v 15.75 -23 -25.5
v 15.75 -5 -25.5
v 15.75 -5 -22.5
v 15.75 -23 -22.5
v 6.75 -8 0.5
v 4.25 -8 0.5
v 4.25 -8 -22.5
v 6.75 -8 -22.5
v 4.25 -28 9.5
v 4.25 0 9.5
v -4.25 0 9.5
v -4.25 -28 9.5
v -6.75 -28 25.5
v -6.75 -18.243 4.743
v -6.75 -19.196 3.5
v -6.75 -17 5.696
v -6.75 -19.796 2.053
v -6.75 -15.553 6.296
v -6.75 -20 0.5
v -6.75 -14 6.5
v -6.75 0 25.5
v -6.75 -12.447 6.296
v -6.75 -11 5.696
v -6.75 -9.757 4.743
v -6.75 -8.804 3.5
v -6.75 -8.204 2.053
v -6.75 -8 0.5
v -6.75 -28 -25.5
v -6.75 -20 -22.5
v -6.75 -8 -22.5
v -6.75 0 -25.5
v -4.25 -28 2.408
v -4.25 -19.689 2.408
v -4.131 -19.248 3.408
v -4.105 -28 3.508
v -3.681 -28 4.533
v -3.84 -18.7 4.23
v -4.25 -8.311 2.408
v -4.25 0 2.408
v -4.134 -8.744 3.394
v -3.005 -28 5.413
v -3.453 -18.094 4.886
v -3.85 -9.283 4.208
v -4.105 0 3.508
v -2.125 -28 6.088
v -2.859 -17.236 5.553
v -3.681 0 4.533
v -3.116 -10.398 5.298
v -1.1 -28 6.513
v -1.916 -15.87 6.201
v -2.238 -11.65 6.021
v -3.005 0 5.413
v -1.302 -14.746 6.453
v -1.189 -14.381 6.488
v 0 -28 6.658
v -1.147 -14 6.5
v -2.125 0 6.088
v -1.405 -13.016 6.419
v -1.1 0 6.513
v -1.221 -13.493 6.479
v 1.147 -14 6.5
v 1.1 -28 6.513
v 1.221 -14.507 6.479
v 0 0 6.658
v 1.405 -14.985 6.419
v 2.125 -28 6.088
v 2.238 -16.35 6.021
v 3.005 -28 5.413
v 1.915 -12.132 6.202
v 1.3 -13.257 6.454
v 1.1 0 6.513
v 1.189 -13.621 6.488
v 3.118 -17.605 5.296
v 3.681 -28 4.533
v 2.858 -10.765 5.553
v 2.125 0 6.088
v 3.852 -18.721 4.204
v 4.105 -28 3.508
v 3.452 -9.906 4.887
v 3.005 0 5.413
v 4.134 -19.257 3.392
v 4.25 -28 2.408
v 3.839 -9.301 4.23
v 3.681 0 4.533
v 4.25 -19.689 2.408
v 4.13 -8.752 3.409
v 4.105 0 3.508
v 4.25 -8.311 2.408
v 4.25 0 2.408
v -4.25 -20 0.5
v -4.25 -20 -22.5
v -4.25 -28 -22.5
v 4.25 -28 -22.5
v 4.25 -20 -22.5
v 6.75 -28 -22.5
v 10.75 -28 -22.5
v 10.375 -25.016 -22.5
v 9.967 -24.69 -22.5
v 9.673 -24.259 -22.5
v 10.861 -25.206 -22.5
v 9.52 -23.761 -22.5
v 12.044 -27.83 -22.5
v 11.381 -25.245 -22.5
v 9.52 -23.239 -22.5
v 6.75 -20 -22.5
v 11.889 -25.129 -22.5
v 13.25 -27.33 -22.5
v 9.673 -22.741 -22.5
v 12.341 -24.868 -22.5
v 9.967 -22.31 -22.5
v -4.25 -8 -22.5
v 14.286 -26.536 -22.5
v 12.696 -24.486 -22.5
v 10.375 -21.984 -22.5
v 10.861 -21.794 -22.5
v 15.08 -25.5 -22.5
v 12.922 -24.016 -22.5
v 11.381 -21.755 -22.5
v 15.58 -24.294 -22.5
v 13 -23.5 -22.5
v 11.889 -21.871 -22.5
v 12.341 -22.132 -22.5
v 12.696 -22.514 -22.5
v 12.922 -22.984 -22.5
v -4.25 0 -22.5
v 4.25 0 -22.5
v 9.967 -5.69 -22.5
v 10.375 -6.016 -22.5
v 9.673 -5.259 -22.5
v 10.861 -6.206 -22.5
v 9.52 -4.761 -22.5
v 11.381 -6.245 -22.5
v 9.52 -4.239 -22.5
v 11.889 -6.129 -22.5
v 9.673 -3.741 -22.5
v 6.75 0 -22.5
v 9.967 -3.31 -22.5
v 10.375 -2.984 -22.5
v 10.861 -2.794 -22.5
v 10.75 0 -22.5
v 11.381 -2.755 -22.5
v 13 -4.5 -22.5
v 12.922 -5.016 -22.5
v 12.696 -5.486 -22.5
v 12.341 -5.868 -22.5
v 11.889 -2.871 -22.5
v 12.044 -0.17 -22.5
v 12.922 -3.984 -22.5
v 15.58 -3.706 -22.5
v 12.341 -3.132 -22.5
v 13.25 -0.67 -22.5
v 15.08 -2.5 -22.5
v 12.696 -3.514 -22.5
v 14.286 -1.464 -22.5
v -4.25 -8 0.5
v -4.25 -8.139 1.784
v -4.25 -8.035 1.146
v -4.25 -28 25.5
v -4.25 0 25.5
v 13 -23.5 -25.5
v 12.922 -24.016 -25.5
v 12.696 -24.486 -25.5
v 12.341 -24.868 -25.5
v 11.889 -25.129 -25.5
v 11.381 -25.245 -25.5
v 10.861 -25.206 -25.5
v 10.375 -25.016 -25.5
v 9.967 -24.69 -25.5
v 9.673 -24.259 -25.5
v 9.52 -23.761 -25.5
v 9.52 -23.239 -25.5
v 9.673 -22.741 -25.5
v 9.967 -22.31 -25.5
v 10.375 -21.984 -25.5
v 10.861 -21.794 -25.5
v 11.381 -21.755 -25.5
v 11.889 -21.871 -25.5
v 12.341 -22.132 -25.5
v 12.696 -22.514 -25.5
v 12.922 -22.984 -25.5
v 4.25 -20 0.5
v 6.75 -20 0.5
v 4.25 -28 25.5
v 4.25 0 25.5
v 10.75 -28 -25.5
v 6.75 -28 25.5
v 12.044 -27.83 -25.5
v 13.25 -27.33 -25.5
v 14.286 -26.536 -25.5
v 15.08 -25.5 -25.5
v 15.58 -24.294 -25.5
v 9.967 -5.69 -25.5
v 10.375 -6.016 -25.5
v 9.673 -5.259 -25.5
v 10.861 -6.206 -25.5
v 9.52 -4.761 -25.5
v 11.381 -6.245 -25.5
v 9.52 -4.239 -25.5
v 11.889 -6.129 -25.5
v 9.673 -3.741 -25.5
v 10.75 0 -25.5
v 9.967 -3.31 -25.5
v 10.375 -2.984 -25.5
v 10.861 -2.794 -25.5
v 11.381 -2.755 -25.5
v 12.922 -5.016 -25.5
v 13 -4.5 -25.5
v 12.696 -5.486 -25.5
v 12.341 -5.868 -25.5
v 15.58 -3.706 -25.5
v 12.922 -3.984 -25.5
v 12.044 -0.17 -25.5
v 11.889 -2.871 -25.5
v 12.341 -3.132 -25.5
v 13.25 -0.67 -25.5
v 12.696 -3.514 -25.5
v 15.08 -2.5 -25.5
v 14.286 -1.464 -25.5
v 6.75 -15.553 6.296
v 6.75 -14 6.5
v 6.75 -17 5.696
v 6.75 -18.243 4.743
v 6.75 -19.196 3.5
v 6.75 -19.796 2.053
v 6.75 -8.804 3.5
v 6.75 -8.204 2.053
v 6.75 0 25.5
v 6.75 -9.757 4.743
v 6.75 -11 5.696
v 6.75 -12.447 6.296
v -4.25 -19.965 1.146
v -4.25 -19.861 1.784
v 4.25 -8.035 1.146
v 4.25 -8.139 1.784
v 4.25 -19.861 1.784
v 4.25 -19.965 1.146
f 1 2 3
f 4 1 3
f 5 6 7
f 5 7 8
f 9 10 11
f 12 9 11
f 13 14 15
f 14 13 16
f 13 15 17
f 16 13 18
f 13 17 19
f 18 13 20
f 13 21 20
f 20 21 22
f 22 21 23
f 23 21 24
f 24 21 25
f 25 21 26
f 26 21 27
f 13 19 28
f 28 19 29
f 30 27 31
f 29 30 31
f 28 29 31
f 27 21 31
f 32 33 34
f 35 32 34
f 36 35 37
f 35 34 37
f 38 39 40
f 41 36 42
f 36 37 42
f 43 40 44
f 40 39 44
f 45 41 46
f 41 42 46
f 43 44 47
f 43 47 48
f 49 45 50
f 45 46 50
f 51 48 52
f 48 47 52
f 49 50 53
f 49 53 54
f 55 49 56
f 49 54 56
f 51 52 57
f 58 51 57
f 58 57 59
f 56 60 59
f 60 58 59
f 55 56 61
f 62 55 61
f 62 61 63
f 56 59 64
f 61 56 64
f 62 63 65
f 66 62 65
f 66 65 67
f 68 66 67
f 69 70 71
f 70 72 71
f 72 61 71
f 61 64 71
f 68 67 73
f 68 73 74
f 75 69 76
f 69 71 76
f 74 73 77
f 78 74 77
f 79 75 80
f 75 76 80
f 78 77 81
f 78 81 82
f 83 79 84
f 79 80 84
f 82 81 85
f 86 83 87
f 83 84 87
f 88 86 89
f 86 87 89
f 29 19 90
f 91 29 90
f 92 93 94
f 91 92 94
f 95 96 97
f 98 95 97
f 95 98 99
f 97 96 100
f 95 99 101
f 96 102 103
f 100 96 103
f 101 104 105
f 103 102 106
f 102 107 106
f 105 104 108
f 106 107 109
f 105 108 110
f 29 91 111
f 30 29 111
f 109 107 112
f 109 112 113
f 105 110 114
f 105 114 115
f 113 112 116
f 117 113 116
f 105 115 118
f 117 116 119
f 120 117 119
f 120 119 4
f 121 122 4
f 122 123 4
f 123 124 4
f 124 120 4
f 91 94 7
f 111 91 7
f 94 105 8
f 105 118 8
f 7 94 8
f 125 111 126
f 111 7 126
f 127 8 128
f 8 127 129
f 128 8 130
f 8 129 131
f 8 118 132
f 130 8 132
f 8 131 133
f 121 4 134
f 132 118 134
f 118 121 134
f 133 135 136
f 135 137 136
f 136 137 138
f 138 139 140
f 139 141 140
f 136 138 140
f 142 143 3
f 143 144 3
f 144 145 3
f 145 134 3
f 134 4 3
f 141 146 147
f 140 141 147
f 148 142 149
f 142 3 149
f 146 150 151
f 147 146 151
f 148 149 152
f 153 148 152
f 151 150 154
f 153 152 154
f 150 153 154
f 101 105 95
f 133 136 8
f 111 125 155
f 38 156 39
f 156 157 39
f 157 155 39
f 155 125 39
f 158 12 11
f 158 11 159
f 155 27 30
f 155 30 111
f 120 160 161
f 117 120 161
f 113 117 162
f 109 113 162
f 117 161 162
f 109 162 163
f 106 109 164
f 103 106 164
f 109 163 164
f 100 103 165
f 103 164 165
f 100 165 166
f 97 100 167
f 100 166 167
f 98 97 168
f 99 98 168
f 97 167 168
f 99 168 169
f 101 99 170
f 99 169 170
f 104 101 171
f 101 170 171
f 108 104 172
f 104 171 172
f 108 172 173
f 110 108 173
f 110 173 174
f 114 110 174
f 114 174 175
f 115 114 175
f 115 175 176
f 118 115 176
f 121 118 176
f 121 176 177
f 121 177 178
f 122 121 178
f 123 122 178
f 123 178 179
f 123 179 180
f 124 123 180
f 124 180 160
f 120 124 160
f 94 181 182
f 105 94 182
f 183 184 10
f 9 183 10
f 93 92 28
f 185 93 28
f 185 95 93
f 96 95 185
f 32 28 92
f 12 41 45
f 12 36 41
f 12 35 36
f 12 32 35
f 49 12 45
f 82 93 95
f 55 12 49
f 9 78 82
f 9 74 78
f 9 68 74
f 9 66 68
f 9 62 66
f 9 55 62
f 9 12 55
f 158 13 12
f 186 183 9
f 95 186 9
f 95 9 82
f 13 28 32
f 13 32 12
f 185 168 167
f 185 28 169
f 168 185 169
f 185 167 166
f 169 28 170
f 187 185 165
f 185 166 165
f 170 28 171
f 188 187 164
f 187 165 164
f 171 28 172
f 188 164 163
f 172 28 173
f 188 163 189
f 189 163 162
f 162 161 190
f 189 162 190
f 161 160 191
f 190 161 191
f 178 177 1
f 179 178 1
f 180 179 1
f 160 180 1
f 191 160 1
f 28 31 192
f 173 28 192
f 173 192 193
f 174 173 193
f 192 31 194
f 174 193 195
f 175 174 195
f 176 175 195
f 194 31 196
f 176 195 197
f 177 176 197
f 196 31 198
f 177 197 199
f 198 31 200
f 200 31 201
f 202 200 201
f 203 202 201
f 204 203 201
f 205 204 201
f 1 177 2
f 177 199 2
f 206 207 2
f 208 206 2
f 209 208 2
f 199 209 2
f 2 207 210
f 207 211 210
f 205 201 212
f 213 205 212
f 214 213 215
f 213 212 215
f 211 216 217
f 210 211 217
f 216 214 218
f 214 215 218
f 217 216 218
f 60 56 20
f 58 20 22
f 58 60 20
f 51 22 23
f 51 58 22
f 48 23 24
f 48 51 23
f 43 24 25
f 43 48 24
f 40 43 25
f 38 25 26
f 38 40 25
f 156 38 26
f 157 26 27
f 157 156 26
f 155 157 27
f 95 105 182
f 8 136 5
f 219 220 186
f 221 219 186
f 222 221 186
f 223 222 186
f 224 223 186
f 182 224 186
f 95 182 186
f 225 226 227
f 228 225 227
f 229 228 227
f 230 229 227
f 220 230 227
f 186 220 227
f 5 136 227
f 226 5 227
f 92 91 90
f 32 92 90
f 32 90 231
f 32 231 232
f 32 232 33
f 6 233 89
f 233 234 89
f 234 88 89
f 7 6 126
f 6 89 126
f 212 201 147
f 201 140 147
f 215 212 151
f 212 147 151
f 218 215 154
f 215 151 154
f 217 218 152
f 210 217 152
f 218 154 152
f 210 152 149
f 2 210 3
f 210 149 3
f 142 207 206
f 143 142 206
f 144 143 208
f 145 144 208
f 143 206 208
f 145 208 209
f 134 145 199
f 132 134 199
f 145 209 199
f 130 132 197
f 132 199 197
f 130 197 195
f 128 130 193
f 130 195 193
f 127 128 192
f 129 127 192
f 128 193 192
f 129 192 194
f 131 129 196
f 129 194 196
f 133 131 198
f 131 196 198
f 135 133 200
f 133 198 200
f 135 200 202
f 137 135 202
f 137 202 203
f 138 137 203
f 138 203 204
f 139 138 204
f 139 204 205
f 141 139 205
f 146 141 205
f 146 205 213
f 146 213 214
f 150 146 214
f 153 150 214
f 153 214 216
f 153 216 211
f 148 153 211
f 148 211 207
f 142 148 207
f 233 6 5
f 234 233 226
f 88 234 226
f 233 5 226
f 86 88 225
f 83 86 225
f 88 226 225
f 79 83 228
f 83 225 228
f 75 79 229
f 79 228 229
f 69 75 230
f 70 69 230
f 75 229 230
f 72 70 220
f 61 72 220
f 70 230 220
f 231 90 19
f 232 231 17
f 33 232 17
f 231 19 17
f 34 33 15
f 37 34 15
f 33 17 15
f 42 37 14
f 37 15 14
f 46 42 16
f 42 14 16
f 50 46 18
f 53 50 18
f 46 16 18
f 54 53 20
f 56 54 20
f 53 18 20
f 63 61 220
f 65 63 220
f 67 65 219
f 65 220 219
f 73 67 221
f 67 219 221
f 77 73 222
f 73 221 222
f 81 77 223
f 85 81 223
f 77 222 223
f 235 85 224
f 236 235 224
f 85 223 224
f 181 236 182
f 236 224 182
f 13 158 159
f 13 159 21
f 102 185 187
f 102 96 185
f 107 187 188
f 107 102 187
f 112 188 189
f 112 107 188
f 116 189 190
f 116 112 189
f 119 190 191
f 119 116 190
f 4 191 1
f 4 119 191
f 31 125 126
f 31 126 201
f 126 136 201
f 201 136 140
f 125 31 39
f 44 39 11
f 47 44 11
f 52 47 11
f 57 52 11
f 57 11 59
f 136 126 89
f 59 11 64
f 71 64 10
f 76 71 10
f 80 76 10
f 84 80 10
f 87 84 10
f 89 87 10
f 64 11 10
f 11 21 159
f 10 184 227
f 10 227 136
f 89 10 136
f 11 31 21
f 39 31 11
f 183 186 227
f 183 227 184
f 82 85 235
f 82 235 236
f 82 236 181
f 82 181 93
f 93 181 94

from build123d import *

# Parameters (mm, degrees)
F1_DEPTH     = 28
F2_R         = 1.75
F3_DEPTH     = 25
F4_W         = 12
F4_H         = 29
F5_DEPTH     = 25
F6_T4_DEPTH  = 28
F6_T10_DEPTH = 28
F6_T16_DEPTH = 28
F6_T23_DEPTH = 28
F6_T29_DEPTH = 28
F6_T35_DEPTH = 28
F6_T41_DEPTH = 28
F6_T47_DEPTH = 28
F6_T54_DEPTH = 28
F6_T60_DEPTH = 28
F7_R         = 5.99999
F8_R         = 5


# Not quite as in the source:
# - a fillet or chamfer that OpenCascade refuses, or shapes differently, is made with other operations: its cross-section is extruded or revolved along the edge and cut away or added
# - a fillet or chamfer is up to 0.001 mm smaller than in the source, because OpenCascade refuses the exact size


with BuildPart() as f1:
    # F0 (on Front) → F1 (new body)
    with BuildSketch(Plane.XZ):
        Polygon((-4.25, 25.5), (-6.75, 25.5), (-6.75, -22.5), (-6.75, -25.5), (-4.25, -25.5), (4.25, -25.5), (6.75, -25.5), (15.75, -25.5), (15.75, -22.5), (6.75, -22.5), (6.75, 25.5), (4.25, 25.5), (4.25, 9.5), (0, 9.5), (-4.25, 9.5), align=None)
        Polygon((4.25, -22.5), (-4.25, -22.5), (-4.25, 6.6576944664), (0, 6.6576944664), (4.25, 6.6576944664), align=None, mode=Mode.SUBTRACT)
    extrude(amount=F1_DEPTH)

    # F2 (on face) → F3 (cut)
    with BuildSketch(Plane(origin=(0, 0, -25.5), x_dir=(1, 0, 0), z_dir=(0, 0, -1))):
        with Locations((11.25, 23.5)):
            Circle(F2_R)
        with Locations((11.25, 4.5)):
            Circle(F2_R)
    extrude(amount=-F3_DEPTH, mode=Mode.SUBTRACT)

    # F4 (on face) → F5 (cut)
    with BuildSketch(Plane.YZ.offset(6.75)):
        with Locations((-14, -8)):
            Rectangle(F4_W, F4_H)
    extrude(amount=-F5_DEPTH, mode=Mode.SUBTRACT)

    # F6: fillet of radius 4.25 on 2 edges, made by hand


with BuildPart() as f6_tool2:
    # F6_s3 → F6_t4 (new body)
    with BuildSketch(Plane.XZ):
        with BuildLine():
            ThreePointArc((0, 6.6576944664), (3.00520382, 5.4128982865), (4.25, 2.4076944664))
            Line((4.25, 2.4076944664), (4.25, 6.6576944664))
            Line((4.25, 6.6576944664), (0, 6.6576944664))
        make_face()
    extrude(amount=F6_T4_DEPTH)

    split(bisect_by=Plane.XZ.offset(8), keep=Keep.BOTTOM)

    split(bisect_by=Plane.XY.offset(6.5), keep=Keep.TOP)


with BuildPart() as f1_1:
    add(f1.part)

    # F6_t1: union F6_tool2
    add(f6_tool2.part)


with BuildPart() as f6_tool8:
    # F6_s9 → F6_t10 (new body)
    with BuildSketch(Plane.XZ):
        with BuildLine():
            ThreePointArc((0, 6.6576944664), (3.00520382, 5.4128982865), (4.25, 2.4076944664))
            Line((4.25, 2.4076944664), (4.25, 6.6576944664))
            Line((4.25, 6.6576944664), (0, 6.6576944664))
        make_face()
    extrude(amount=F6_T10_DEPTH)

    split(bisect_by=Plane.XZ.offset(8), keep=Keep.BOTTOM)

    split(bisect_by=Plane.XY.offset(6.5), keep=Keep.BOTTOM)


with BuildPart() as f1_2:
    add(f1_1.part)

    # F6_t7: union F6_tool8
    add(f6_tool8.part)


with BuildPart() as f6_tool14:
    # F6_s15 → F6_t16 (new body)
    with BuildSketch(Plane.XZ):
        with BuildLine():
            ThreePointArc((0, 6.6576944664), (3.00520382, 5.4128982865), (4.25, 2.4076944664))
            Line((4.25, 2.4076944664), (4.25, 6.6576944664))
            Line((4.25, 6.6576944664), (0, 6.6576944664))
        make_face()
    extrude(amount=F6_T16_DEPTH)

    split(bisect_by=Plane.XZ.offset(8), keep=Keep.TOP)

    split(bisect_by=Plane.XY.offset(6.5), keep=Keep.TOP)

    split(bisect_by=Plane.XZ.offset(20), keep=Keep.BOTTOM)


with BuildPart() as f1_3:
    add(f1_2.part)

    # F6_t13: union F6_tool14
    add(f6_tool14.part)


with BuildPart() as f6_tool21:
    # F6_s22 → F6_t23 (new body)
    with BuildSketch(Plane.XZ):
        with BuildLine():
            ThreePointArc((0, 6.6576944664), (3.00520382, 5.4128982865), (4.25, 2.4076944664))
            Line((4.25, 2.4076944664), (4.25, 6.6576944664))
            Line((4.25, 6.6576944664), (0, 6.6576944664))
        make_face()
    extrude(amount=F6_T23_DEPTH)

    split(bisect_by=Plane.XY.offset(6.5), keep=Keep.TOP)

    split(bisect_by=Plane.XZ.offset(20), keep=Keep.TOP)


with BuildPart() as f1_4:
    add(f1_3.part)

    # F6_t20: union F6_tool21
    add(f6_tool21.part)


with BuildPart() as f6_tool27:
    # F6_s28 → F6_t29 (new body)
    with BuildSketch(Plane.XZ):
        with BuildLine():
            ThreePointArc((0, 6.6576944664), (3.00520382, 5.4128982865), (4.25, 2.4076944664))
            Line((4.25, 2.4076944664), (4.25, 6.6576944664))
            Line((4.25, 6.6576944664), (0, 6.6576944664))
        make_face()
    extrude(amount=F6_T29_DEPTH)

    split(bisect_by=Plane.XY.offset(6.5), keep=Keep.BOTTOM)

    split(bisect_by=Plane.XZ.offset(20), keep=Keep.TOP)


with BuildPart() as f1_5:
    add(f1_4.part)

    # F6_t26: union F6_tool27
    add(f6_tool27.part)


with BuildPart() as f6_tool33:
    # F6_s34 → F6_t35 (new body)
    with BuildSketch(Plane.XZ):
        with BuildLine():
            ThreePointArc((-4.25, 2.4076944664), (-3.00520382, 5.4128982865), (0, 6.6576944664))
            Line((0, 6.6576944664), (-4.25, 6.6576944664))
            Line((-4.25, 6.6576944664), (-4.25, 2.4076944664))
        make_face()
    extrude(amount=F6_T35_DEPTH)

    split(bisect_by=Plane.XZ.offset(8), keep=Keep.BOTTOM)

    split(bisect_by=Plane.XY.offset(6.5), keep=Keep.BOTTOM)


with BuildPart() as f1_6:
    add(f1_5.part)

    # F6_t32: union F6_tool33
    add(f6_tool33.part)


with BuildPart() as f6_tool39:
    # F6_s40 → F6_t41 (new body)
    with BuildSketch(Plane.XZ):
        with BuildLine():
            ThreePointArc((-4.25, 2.4076944664), (-3.00520382, 5.4128982865), (0, 6.6576944664))
            Line((0, 6.6576944664), (-4.25, 6.6576944664))
            Line((-4.25, 6.6576944664), (-4.25, 2.4076944664))
        make_face()
    extrude(amount=F6_T41_DEPTH)

    split(bisect_by=Plane.XZ.offset(8), keep=Keep.BOTTOM)

    split(bisect_by=Plane.XY.offset(6.5), keep=Keep.TOP)


with BuildPart() as f1_7:
    add(f1_6.part)

    # F6_t38: union F6_tool39
    add(f6_tool39.part)


with BuildPart() as f6_tool45:
    # F6_s46 → F6_t47 (new body)
    with BuildSketch(Plane.XZ):
        with BuildLine():
            ThreePointArc((-4.25, 2.4076944664), (-3.00520382, 5.4128982865), (0, 6.6576944664))
            Line((0, 6.6576944664), (-4.25, 6.6576944664))
            Line((-4.25, 6.6576944664), (-4.25, 2.4076944664))
        make_face()
    extrude(amount=F6_T47_DEPTH)

    split(bisect_by=Plane.XZ.offset(20), keep=Keep.BOTTOM)

    split(bisect_by=Plane.XZ.offset(8), keep=Keep.TOP)

    split(bisect_by=Plane.XY.offset(6.5), keep=Keep.TOP)


with BuildPart() as f1_8:
    add(f1_7.part)

    # F6_t44: union F6_tool45
    add(f6_tool45.part)


with BuildPart() as f6_tool52:
    # F6_s53 → F6_t54 (new body)
    with BuildSketch(Plane.XZ):
        with BuildLine():
            ThreePointArc((-4.25, 2.4076944664), (-3.00520382, 5.4128982865), (0, 6.6576944664))
            Line((0, 6.6576944664), (-4.25, 6.6576944664))
            Line((-4.25, 6.6576944664), (-4.25, 2.4076944664))
        make_face()
    extrude(amount=F6_T54_DEPTH)

    split(bisect_by=Plane.XZ.offset(20), keep=Keep.TOP)

    split(bisect_by=Plane.XY.offset(6.5), keep=Keep.BOTTOM)


with BuildPart() as f1_9:
    add(f1_8.part)

    # F6_t51: union F6_tool52
    add(f6_tool52.part)


with BuildPart() as f6_tool58:
    # F6_s59 → F6_t60 (new body)
    with BuildSketch(Plane.XZ):
        with BuildLine():
            ThreePointArc((-4.25, 2.4076944664), (-3.00520382, 5.4128982865), (0, 6.6576944664))
            Line((0, 6.6576944664), (-4.25, 6.6576944664))
            Line((-4.25, 6.6576944664), (-4.25, 2.4076944664))
        make_face()
    extrude(amount=F6_T60_DEPTH)

    split(bisect_by=Plane.XZ.offset(20), keep=Keep.TOP)

    split(bisect_by=Plane.XY.offset(6.5), keep=Keep.TOP)


with BuildPart() as f1_10:
    add(f1_9.part)

    # F6_t57: union F6_tool58
    add(f6_tool58.part)

    # F7 (radius 6 in the source; OpenCascade refuses exactly that, so slightly less here)
    f7_edges = [f1_10.edges().sort_by_distance(p)[0] for p in [
        (3.948484, -20, 6.5),
        (-3.948484, -20, 6.5),
        (-3.948484, -8, 6.5),
        (3.948484, -8, 6.5),
    ]]
    fillet(f7_edges, radius=F7_R)

    # F8
    f8_edges = [f1_10.edges().sort_by_distance(p)[0] for p in [
        (15.75, 0, -24),
        (15.75, -28, -24),
    ]]
    fillet(f8_edges, radius=F8_R)


solid = f1_10.part
